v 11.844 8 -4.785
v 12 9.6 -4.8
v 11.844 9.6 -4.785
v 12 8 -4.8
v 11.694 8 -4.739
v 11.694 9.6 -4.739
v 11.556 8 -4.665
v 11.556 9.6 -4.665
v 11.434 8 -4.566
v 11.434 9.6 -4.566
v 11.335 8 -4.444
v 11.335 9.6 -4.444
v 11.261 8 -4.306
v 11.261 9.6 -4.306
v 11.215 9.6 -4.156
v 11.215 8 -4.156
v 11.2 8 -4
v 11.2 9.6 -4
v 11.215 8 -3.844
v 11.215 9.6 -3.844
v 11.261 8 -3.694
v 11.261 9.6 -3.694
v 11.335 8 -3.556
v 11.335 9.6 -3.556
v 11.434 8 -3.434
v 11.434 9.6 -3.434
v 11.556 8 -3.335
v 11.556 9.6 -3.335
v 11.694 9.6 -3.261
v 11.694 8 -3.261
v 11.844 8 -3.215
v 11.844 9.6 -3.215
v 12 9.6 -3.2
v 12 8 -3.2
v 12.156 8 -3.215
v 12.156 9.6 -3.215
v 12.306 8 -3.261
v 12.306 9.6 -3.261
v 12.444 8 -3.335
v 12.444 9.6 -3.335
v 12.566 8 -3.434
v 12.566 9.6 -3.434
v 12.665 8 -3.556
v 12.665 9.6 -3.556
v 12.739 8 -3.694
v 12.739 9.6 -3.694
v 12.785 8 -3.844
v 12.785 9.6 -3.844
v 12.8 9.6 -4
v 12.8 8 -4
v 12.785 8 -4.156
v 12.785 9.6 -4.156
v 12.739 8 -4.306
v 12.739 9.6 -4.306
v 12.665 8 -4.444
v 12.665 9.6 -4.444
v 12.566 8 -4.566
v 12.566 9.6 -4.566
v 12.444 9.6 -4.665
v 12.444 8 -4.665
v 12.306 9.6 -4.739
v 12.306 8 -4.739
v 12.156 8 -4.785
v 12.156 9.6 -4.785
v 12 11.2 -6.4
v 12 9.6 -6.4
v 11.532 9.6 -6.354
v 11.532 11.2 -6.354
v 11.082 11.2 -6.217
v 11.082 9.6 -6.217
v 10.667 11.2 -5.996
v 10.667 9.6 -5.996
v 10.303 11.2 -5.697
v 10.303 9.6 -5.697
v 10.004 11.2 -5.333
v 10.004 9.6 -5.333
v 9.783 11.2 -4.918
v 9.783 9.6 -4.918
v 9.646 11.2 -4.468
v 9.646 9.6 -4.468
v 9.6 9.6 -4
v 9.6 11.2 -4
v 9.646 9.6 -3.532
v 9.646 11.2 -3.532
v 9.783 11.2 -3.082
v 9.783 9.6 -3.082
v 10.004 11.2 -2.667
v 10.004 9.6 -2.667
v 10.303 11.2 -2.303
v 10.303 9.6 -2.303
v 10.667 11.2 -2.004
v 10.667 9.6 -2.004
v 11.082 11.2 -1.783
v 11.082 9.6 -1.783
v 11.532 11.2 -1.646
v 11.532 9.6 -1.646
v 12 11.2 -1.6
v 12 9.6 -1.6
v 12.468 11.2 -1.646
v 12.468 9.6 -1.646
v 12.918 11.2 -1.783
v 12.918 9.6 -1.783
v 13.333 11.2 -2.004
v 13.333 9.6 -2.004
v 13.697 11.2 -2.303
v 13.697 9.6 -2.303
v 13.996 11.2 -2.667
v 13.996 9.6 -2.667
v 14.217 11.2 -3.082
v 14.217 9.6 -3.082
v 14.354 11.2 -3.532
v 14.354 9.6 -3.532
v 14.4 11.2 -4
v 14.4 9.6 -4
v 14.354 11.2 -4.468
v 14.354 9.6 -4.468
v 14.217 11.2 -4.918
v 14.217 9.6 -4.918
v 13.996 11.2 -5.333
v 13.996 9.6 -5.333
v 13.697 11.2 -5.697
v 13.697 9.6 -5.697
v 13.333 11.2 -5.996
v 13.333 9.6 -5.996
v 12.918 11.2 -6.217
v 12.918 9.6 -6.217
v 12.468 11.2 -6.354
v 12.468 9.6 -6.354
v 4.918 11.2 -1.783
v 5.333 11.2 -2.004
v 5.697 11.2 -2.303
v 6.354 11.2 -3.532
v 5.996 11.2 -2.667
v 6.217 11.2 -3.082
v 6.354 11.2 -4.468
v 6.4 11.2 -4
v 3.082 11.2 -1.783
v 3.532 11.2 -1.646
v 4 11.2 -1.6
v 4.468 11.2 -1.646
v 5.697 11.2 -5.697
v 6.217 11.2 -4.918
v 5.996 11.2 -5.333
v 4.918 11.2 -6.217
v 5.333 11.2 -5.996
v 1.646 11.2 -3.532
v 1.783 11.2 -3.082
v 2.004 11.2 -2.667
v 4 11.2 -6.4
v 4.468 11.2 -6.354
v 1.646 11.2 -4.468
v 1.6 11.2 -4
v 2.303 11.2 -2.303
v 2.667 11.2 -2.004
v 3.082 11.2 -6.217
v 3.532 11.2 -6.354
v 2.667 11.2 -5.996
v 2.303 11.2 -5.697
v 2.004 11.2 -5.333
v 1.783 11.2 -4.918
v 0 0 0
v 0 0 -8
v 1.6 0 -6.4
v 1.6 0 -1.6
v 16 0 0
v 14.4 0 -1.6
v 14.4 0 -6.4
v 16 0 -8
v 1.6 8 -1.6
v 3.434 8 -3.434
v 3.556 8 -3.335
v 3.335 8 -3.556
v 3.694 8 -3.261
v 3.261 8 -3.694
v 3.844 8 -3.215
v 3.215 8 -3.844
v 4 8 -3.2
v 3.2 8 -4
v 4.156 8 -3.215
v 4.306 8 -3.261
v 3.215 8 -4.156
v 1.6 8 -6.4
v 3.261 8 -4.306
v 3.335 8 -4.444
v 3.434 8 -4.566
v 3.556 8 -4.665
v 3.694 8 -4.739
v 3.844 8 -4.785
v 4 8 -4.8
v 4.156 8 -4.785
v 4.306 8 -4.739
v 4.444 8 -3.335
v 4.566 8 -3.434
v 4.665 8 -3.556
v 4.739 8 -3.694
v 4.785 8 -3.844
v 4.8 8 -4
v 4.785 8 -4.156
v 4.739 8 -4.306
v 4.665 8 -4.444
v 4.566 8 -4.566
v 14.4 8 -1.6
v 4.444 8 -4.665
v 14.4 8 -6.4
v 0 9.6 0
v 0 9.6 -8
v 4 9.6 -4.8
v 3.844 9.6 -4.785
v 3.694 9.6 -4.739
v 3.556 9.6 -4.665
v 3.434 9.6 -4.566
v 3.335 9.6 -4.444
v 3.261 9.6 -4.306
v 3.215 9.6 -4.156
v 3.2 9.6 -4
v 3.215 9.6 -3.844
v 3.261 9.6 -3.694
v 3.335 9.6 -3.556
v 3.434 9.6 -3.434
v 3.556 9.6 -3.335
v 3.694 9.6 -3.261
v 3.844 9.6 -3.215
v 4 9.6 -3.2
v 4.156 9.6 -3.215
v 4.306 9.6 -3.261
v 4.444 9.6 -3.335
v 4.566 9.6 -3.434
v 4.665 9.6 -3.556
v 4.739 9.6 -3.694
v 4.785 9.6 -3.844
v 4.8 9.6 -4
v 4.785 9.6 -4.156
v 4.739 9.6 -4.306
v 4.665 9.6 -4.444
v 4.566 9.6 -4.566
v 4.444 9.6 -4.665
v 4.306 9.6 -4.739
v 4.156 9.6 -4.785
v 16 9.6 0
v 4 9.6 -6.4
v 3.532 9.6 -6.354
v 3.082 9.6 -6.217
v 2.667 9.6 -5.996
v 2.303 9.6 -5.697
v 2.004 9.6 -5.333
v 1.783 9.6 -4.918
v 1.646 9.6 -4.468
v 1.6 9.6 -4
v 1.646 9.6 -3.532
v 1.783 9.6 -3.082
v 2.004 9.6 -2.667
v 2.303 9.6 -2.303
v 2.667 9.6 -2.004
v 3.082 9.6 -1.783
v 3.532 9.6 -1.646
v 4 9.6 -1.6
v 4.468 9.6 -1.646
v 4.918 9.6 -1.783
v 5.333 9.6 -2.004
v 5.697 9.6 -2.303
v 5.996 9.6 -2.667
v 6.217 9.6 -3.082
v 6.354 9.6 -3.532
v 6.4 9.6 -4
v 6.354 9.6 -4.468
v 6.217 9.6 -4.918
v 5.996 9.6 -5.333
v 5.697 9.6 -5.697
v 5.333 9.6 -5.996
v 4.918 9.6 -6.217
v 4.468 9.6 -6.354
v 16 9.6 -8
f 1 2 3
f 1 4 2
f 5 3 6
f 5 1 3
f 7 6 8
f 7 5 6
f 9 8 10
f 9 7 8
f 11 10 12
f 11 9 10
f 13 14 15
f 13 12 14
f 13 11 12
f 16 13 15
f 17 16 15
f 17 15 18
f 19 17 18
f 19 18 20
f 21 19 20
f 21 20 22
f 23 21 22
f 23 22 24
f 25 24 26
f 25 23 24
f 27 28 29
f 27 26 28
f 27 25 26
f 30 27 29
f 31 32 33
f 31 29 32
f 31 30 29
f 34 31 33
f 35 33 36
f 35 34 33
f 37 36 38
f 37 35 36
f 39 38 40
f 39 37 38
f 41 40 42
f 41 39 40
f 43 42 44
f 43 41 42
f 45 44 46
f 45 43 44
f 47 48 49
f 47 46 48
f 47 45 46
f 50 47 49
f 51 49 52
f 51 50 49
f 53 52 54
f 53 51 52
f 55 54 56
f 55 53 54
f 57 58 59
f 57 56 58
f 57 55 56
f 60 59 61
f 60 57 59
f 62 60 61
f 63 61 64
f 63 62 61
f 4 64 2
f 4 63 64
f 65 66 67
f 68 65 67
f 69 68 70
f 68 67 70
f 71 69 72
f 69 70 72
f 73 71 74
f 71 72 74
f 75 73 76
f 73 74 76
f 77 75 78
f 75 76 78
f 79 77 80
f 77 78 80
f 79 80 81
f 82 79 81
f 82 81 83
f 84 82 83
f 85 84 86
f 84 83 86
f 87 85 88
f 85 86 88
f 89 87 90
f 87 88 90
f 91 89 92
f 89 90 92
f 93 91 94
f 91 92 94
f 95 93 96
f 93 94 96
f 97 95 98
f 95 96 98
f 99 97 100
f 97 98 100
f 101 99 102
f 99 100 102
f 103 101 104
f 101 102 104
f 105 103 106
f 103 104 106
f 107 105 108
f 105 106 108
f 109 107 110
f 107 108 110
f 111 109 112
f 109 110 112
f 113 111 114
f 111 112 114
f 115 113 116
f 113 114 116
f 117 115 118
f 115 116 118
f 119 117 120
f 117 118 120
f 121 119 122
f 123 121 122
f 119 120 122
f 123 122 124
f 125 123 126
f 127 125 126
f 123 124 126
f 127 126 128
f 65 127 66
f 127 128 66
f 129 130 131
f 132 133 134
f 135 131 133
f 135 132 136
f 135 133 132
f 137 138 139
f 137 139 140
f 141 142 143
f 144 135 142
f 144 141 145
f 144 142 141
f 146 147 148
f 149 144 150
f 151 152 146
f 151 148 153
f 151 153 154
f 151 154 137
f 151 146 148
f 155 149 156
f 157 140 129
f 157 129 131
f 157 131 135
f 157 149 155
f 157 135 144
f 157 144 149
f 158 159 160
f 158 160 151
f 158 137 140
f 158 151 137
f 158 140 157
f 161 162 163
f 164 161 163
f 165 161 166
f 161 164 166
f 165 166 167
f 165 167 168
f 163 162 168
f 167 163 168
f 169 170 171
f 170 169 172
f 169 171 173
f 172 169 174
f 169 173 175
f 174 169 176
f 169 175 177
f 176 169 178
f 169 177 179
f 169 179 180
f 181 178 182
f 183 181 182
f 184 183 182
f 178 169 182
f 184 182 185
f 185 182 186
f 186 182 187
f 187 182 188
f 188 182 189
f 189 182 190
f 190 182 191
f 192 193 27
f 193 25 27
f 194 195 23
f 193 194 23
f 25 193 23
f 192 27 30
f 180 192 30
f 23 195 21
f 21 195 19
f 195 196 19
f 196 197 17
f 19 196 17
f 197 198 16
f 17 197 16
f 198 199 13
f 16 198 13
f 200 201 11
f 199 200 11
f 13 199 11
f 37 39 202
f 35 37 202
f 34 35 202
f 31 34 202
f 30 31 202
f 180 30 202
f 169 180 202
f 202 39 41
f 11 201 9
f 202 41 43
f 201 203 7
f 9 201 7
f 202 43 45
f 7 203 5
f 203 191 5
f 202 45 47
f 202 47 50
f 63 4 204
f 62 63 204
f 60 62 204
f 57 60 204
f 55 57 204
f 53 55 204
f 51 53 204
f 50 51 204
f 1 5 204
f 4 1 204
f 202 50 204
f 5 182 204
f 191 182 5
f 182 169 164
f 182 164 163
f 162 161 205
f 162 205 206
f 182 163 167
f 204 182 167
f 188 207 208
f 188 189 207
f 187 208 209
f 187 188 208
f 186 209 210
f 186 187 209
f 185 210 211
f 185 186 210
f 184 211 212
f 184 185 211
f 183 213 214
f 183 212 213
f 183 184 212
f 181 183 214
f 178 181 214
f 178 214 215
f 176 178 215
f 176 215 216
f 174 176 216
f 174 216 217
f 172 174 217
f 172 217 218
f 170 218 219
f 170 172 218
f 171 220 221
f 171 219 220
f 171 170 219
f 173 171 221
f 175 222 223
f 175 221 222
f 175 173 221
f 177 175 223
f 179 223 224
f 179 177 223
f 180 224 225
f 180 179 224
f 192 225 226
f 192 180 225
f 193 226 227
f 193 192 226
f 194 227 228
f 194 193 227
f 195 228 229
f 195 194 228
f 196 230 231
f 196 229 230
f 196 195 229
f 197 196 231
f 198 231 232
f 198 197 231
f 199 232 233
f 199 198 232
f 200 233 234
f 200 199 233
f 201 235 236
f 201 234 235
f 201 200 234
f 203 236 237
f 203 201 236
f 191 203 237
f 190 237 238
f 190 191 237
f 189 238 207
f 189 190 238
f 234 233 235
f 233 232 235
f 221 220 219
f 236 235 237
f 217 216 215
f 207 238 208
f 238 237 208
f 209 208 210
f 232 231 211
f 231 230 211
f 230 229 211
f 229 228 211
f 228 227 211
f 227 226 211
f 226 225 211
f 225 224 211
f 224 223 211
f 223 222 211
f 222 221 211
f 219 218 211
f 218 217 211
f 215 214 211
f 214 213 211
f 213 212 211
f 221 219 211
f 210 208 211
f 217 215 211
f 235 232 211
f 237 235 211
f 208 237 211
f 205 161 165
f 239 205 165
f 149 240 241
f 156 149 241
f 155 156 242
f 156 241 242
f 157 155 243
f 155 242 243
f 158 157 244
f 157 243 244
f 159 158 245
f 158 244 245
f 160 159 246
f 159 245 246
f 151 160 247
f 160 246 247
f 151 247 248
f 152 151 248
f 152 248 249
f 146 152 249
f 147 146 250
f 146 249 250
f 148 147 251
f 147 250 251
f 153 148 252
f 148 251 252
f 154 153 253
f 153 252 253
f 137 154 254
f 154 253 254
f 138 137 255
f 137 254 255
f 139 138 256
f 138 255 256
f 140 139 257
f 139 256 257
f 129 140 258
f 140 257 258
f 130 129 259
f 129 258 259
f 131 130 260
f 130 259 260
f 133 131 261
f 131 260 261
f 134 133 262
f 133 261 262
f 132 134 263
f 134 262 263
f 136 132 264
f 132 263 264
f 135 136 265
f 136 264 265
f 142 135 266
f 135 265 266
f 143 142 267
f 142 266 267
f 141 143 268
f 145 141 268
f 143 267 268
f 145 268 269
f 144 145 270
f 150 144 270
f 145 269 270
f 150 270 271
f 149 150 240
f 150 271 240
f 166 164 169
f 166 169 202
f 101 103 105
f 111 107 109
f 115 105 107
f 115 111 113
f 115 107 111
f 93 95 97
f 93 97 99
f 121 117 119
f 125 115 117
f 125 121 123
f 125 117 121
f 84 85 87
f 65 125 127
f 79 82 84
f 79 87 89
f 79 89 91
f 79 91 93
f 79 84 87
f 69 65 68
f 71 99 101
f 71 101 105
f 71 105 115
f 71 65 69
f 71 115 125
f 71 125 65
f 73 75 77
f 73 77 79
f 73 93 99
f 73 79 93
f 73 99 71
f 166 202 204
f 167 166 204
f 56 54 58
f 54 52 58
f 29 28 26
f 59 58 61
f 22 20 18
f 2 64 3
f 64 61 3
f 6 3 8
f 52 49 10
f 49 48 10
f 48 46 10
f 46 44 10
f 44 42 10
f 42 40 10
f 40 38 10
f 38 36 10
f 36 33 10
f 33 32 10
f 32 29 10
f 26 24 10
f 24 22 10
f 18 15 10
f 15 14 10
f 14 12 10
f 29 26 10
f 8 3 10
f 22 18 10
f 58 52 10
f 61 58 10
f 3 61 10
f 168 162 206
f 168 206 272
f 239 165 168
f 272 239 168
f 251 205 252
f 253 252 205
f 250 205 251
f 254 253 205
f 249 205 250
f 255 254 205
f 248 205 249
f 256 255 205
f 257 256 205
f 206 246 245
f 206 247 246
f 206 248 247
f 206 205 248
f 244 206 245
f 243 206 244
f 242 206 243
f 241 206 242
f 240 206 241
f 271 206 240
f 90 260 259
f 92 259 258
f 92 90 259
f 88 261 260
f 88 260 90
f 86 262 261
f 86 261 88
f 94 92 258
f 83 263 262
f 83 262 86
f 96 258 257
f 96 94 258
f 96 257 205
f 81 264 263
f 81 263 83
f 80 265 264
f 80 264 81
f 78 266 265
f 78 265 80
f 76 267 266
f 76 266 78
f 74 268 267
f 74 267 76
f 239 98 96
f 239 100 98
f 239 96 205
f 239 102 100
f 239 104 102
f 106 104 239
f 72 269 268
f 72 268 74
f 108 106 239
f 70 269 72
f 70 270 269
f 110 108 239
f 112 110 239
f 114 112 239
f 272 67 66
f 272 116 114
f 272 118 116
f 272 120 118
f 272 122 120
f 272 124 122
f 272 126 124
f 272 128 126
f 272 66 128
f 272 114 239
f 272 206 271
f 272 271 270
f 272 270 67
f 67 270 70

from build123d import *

# Parameters (mm, degrees)
SKETCH1_W            = 16
SKETCH1_H            = 8
BOSS_EXTRUDE1_DEPTH  = 9.6
SKETCH2_R            = 2.4
BOSS_EXTRUDE2_DEPTH  = 1.6
LPATTERN1_COUNT      = 2
LPATTERN1_PITCH      = 8
LPATTERN1_COUNT_DIR2 = 4
LPATTERN1_PITCH_DIR2 = 8
SHELL1_T             = -1.6


with BuildPart() as part:
    # Sketch1 → Boss-Extrude1 (new body)
    with BuildSketch(Plane(origin=(0, 0, 0), x_dir=(1, 0, 0), z_dir=(0, 1, 0))):
        with Locations((8, 4)):
            Rectangle(SKETCH1_W, SKETCH1_H)
    extrude(amount=BOSS_EXTRUDE1_DEPTH)

    # Sketch2 → Boss-Extrude2 (add)
    with BuildSketch(Plane(origin=(0, 9.6, 0), x_dir=(1, 0, 0), z_dir=(0, 1, 0))):
        with Locations(Location((12, 4, 0), (0, 0, 90))):
            Circle(SKETCH2_R)
    boss_extrude2 = extrude(amount=BOSS_EXTRUDE2_DEPTH)

    # LPattern1: Boss-Extrude2 2 × 4, 6 skipped
    with Locations(*[(-i * LPATTERN1_PITCH, 0, -j * LPATTERN1_PITCH_DIR2) for i in range(LPATTERN1_COUNT) for j in range(LPATTERN1_COUNT_DIR2) if (i, j) not in ((0, 0), (0, 1), (0, 2), (0, 3), (1, 1), (1, 2), (1, 3))]):
        add(boss_extrude2)

    # Shell1
    shell1_openings = [part.faces().sort_by_distance(p)[0] for p in [
        (8, 0, -4),
    ]]
    offset(amount=SHELL1_T, openings=shell1_openings, kind=Kind.INTERSECTION)


solid = part.part
